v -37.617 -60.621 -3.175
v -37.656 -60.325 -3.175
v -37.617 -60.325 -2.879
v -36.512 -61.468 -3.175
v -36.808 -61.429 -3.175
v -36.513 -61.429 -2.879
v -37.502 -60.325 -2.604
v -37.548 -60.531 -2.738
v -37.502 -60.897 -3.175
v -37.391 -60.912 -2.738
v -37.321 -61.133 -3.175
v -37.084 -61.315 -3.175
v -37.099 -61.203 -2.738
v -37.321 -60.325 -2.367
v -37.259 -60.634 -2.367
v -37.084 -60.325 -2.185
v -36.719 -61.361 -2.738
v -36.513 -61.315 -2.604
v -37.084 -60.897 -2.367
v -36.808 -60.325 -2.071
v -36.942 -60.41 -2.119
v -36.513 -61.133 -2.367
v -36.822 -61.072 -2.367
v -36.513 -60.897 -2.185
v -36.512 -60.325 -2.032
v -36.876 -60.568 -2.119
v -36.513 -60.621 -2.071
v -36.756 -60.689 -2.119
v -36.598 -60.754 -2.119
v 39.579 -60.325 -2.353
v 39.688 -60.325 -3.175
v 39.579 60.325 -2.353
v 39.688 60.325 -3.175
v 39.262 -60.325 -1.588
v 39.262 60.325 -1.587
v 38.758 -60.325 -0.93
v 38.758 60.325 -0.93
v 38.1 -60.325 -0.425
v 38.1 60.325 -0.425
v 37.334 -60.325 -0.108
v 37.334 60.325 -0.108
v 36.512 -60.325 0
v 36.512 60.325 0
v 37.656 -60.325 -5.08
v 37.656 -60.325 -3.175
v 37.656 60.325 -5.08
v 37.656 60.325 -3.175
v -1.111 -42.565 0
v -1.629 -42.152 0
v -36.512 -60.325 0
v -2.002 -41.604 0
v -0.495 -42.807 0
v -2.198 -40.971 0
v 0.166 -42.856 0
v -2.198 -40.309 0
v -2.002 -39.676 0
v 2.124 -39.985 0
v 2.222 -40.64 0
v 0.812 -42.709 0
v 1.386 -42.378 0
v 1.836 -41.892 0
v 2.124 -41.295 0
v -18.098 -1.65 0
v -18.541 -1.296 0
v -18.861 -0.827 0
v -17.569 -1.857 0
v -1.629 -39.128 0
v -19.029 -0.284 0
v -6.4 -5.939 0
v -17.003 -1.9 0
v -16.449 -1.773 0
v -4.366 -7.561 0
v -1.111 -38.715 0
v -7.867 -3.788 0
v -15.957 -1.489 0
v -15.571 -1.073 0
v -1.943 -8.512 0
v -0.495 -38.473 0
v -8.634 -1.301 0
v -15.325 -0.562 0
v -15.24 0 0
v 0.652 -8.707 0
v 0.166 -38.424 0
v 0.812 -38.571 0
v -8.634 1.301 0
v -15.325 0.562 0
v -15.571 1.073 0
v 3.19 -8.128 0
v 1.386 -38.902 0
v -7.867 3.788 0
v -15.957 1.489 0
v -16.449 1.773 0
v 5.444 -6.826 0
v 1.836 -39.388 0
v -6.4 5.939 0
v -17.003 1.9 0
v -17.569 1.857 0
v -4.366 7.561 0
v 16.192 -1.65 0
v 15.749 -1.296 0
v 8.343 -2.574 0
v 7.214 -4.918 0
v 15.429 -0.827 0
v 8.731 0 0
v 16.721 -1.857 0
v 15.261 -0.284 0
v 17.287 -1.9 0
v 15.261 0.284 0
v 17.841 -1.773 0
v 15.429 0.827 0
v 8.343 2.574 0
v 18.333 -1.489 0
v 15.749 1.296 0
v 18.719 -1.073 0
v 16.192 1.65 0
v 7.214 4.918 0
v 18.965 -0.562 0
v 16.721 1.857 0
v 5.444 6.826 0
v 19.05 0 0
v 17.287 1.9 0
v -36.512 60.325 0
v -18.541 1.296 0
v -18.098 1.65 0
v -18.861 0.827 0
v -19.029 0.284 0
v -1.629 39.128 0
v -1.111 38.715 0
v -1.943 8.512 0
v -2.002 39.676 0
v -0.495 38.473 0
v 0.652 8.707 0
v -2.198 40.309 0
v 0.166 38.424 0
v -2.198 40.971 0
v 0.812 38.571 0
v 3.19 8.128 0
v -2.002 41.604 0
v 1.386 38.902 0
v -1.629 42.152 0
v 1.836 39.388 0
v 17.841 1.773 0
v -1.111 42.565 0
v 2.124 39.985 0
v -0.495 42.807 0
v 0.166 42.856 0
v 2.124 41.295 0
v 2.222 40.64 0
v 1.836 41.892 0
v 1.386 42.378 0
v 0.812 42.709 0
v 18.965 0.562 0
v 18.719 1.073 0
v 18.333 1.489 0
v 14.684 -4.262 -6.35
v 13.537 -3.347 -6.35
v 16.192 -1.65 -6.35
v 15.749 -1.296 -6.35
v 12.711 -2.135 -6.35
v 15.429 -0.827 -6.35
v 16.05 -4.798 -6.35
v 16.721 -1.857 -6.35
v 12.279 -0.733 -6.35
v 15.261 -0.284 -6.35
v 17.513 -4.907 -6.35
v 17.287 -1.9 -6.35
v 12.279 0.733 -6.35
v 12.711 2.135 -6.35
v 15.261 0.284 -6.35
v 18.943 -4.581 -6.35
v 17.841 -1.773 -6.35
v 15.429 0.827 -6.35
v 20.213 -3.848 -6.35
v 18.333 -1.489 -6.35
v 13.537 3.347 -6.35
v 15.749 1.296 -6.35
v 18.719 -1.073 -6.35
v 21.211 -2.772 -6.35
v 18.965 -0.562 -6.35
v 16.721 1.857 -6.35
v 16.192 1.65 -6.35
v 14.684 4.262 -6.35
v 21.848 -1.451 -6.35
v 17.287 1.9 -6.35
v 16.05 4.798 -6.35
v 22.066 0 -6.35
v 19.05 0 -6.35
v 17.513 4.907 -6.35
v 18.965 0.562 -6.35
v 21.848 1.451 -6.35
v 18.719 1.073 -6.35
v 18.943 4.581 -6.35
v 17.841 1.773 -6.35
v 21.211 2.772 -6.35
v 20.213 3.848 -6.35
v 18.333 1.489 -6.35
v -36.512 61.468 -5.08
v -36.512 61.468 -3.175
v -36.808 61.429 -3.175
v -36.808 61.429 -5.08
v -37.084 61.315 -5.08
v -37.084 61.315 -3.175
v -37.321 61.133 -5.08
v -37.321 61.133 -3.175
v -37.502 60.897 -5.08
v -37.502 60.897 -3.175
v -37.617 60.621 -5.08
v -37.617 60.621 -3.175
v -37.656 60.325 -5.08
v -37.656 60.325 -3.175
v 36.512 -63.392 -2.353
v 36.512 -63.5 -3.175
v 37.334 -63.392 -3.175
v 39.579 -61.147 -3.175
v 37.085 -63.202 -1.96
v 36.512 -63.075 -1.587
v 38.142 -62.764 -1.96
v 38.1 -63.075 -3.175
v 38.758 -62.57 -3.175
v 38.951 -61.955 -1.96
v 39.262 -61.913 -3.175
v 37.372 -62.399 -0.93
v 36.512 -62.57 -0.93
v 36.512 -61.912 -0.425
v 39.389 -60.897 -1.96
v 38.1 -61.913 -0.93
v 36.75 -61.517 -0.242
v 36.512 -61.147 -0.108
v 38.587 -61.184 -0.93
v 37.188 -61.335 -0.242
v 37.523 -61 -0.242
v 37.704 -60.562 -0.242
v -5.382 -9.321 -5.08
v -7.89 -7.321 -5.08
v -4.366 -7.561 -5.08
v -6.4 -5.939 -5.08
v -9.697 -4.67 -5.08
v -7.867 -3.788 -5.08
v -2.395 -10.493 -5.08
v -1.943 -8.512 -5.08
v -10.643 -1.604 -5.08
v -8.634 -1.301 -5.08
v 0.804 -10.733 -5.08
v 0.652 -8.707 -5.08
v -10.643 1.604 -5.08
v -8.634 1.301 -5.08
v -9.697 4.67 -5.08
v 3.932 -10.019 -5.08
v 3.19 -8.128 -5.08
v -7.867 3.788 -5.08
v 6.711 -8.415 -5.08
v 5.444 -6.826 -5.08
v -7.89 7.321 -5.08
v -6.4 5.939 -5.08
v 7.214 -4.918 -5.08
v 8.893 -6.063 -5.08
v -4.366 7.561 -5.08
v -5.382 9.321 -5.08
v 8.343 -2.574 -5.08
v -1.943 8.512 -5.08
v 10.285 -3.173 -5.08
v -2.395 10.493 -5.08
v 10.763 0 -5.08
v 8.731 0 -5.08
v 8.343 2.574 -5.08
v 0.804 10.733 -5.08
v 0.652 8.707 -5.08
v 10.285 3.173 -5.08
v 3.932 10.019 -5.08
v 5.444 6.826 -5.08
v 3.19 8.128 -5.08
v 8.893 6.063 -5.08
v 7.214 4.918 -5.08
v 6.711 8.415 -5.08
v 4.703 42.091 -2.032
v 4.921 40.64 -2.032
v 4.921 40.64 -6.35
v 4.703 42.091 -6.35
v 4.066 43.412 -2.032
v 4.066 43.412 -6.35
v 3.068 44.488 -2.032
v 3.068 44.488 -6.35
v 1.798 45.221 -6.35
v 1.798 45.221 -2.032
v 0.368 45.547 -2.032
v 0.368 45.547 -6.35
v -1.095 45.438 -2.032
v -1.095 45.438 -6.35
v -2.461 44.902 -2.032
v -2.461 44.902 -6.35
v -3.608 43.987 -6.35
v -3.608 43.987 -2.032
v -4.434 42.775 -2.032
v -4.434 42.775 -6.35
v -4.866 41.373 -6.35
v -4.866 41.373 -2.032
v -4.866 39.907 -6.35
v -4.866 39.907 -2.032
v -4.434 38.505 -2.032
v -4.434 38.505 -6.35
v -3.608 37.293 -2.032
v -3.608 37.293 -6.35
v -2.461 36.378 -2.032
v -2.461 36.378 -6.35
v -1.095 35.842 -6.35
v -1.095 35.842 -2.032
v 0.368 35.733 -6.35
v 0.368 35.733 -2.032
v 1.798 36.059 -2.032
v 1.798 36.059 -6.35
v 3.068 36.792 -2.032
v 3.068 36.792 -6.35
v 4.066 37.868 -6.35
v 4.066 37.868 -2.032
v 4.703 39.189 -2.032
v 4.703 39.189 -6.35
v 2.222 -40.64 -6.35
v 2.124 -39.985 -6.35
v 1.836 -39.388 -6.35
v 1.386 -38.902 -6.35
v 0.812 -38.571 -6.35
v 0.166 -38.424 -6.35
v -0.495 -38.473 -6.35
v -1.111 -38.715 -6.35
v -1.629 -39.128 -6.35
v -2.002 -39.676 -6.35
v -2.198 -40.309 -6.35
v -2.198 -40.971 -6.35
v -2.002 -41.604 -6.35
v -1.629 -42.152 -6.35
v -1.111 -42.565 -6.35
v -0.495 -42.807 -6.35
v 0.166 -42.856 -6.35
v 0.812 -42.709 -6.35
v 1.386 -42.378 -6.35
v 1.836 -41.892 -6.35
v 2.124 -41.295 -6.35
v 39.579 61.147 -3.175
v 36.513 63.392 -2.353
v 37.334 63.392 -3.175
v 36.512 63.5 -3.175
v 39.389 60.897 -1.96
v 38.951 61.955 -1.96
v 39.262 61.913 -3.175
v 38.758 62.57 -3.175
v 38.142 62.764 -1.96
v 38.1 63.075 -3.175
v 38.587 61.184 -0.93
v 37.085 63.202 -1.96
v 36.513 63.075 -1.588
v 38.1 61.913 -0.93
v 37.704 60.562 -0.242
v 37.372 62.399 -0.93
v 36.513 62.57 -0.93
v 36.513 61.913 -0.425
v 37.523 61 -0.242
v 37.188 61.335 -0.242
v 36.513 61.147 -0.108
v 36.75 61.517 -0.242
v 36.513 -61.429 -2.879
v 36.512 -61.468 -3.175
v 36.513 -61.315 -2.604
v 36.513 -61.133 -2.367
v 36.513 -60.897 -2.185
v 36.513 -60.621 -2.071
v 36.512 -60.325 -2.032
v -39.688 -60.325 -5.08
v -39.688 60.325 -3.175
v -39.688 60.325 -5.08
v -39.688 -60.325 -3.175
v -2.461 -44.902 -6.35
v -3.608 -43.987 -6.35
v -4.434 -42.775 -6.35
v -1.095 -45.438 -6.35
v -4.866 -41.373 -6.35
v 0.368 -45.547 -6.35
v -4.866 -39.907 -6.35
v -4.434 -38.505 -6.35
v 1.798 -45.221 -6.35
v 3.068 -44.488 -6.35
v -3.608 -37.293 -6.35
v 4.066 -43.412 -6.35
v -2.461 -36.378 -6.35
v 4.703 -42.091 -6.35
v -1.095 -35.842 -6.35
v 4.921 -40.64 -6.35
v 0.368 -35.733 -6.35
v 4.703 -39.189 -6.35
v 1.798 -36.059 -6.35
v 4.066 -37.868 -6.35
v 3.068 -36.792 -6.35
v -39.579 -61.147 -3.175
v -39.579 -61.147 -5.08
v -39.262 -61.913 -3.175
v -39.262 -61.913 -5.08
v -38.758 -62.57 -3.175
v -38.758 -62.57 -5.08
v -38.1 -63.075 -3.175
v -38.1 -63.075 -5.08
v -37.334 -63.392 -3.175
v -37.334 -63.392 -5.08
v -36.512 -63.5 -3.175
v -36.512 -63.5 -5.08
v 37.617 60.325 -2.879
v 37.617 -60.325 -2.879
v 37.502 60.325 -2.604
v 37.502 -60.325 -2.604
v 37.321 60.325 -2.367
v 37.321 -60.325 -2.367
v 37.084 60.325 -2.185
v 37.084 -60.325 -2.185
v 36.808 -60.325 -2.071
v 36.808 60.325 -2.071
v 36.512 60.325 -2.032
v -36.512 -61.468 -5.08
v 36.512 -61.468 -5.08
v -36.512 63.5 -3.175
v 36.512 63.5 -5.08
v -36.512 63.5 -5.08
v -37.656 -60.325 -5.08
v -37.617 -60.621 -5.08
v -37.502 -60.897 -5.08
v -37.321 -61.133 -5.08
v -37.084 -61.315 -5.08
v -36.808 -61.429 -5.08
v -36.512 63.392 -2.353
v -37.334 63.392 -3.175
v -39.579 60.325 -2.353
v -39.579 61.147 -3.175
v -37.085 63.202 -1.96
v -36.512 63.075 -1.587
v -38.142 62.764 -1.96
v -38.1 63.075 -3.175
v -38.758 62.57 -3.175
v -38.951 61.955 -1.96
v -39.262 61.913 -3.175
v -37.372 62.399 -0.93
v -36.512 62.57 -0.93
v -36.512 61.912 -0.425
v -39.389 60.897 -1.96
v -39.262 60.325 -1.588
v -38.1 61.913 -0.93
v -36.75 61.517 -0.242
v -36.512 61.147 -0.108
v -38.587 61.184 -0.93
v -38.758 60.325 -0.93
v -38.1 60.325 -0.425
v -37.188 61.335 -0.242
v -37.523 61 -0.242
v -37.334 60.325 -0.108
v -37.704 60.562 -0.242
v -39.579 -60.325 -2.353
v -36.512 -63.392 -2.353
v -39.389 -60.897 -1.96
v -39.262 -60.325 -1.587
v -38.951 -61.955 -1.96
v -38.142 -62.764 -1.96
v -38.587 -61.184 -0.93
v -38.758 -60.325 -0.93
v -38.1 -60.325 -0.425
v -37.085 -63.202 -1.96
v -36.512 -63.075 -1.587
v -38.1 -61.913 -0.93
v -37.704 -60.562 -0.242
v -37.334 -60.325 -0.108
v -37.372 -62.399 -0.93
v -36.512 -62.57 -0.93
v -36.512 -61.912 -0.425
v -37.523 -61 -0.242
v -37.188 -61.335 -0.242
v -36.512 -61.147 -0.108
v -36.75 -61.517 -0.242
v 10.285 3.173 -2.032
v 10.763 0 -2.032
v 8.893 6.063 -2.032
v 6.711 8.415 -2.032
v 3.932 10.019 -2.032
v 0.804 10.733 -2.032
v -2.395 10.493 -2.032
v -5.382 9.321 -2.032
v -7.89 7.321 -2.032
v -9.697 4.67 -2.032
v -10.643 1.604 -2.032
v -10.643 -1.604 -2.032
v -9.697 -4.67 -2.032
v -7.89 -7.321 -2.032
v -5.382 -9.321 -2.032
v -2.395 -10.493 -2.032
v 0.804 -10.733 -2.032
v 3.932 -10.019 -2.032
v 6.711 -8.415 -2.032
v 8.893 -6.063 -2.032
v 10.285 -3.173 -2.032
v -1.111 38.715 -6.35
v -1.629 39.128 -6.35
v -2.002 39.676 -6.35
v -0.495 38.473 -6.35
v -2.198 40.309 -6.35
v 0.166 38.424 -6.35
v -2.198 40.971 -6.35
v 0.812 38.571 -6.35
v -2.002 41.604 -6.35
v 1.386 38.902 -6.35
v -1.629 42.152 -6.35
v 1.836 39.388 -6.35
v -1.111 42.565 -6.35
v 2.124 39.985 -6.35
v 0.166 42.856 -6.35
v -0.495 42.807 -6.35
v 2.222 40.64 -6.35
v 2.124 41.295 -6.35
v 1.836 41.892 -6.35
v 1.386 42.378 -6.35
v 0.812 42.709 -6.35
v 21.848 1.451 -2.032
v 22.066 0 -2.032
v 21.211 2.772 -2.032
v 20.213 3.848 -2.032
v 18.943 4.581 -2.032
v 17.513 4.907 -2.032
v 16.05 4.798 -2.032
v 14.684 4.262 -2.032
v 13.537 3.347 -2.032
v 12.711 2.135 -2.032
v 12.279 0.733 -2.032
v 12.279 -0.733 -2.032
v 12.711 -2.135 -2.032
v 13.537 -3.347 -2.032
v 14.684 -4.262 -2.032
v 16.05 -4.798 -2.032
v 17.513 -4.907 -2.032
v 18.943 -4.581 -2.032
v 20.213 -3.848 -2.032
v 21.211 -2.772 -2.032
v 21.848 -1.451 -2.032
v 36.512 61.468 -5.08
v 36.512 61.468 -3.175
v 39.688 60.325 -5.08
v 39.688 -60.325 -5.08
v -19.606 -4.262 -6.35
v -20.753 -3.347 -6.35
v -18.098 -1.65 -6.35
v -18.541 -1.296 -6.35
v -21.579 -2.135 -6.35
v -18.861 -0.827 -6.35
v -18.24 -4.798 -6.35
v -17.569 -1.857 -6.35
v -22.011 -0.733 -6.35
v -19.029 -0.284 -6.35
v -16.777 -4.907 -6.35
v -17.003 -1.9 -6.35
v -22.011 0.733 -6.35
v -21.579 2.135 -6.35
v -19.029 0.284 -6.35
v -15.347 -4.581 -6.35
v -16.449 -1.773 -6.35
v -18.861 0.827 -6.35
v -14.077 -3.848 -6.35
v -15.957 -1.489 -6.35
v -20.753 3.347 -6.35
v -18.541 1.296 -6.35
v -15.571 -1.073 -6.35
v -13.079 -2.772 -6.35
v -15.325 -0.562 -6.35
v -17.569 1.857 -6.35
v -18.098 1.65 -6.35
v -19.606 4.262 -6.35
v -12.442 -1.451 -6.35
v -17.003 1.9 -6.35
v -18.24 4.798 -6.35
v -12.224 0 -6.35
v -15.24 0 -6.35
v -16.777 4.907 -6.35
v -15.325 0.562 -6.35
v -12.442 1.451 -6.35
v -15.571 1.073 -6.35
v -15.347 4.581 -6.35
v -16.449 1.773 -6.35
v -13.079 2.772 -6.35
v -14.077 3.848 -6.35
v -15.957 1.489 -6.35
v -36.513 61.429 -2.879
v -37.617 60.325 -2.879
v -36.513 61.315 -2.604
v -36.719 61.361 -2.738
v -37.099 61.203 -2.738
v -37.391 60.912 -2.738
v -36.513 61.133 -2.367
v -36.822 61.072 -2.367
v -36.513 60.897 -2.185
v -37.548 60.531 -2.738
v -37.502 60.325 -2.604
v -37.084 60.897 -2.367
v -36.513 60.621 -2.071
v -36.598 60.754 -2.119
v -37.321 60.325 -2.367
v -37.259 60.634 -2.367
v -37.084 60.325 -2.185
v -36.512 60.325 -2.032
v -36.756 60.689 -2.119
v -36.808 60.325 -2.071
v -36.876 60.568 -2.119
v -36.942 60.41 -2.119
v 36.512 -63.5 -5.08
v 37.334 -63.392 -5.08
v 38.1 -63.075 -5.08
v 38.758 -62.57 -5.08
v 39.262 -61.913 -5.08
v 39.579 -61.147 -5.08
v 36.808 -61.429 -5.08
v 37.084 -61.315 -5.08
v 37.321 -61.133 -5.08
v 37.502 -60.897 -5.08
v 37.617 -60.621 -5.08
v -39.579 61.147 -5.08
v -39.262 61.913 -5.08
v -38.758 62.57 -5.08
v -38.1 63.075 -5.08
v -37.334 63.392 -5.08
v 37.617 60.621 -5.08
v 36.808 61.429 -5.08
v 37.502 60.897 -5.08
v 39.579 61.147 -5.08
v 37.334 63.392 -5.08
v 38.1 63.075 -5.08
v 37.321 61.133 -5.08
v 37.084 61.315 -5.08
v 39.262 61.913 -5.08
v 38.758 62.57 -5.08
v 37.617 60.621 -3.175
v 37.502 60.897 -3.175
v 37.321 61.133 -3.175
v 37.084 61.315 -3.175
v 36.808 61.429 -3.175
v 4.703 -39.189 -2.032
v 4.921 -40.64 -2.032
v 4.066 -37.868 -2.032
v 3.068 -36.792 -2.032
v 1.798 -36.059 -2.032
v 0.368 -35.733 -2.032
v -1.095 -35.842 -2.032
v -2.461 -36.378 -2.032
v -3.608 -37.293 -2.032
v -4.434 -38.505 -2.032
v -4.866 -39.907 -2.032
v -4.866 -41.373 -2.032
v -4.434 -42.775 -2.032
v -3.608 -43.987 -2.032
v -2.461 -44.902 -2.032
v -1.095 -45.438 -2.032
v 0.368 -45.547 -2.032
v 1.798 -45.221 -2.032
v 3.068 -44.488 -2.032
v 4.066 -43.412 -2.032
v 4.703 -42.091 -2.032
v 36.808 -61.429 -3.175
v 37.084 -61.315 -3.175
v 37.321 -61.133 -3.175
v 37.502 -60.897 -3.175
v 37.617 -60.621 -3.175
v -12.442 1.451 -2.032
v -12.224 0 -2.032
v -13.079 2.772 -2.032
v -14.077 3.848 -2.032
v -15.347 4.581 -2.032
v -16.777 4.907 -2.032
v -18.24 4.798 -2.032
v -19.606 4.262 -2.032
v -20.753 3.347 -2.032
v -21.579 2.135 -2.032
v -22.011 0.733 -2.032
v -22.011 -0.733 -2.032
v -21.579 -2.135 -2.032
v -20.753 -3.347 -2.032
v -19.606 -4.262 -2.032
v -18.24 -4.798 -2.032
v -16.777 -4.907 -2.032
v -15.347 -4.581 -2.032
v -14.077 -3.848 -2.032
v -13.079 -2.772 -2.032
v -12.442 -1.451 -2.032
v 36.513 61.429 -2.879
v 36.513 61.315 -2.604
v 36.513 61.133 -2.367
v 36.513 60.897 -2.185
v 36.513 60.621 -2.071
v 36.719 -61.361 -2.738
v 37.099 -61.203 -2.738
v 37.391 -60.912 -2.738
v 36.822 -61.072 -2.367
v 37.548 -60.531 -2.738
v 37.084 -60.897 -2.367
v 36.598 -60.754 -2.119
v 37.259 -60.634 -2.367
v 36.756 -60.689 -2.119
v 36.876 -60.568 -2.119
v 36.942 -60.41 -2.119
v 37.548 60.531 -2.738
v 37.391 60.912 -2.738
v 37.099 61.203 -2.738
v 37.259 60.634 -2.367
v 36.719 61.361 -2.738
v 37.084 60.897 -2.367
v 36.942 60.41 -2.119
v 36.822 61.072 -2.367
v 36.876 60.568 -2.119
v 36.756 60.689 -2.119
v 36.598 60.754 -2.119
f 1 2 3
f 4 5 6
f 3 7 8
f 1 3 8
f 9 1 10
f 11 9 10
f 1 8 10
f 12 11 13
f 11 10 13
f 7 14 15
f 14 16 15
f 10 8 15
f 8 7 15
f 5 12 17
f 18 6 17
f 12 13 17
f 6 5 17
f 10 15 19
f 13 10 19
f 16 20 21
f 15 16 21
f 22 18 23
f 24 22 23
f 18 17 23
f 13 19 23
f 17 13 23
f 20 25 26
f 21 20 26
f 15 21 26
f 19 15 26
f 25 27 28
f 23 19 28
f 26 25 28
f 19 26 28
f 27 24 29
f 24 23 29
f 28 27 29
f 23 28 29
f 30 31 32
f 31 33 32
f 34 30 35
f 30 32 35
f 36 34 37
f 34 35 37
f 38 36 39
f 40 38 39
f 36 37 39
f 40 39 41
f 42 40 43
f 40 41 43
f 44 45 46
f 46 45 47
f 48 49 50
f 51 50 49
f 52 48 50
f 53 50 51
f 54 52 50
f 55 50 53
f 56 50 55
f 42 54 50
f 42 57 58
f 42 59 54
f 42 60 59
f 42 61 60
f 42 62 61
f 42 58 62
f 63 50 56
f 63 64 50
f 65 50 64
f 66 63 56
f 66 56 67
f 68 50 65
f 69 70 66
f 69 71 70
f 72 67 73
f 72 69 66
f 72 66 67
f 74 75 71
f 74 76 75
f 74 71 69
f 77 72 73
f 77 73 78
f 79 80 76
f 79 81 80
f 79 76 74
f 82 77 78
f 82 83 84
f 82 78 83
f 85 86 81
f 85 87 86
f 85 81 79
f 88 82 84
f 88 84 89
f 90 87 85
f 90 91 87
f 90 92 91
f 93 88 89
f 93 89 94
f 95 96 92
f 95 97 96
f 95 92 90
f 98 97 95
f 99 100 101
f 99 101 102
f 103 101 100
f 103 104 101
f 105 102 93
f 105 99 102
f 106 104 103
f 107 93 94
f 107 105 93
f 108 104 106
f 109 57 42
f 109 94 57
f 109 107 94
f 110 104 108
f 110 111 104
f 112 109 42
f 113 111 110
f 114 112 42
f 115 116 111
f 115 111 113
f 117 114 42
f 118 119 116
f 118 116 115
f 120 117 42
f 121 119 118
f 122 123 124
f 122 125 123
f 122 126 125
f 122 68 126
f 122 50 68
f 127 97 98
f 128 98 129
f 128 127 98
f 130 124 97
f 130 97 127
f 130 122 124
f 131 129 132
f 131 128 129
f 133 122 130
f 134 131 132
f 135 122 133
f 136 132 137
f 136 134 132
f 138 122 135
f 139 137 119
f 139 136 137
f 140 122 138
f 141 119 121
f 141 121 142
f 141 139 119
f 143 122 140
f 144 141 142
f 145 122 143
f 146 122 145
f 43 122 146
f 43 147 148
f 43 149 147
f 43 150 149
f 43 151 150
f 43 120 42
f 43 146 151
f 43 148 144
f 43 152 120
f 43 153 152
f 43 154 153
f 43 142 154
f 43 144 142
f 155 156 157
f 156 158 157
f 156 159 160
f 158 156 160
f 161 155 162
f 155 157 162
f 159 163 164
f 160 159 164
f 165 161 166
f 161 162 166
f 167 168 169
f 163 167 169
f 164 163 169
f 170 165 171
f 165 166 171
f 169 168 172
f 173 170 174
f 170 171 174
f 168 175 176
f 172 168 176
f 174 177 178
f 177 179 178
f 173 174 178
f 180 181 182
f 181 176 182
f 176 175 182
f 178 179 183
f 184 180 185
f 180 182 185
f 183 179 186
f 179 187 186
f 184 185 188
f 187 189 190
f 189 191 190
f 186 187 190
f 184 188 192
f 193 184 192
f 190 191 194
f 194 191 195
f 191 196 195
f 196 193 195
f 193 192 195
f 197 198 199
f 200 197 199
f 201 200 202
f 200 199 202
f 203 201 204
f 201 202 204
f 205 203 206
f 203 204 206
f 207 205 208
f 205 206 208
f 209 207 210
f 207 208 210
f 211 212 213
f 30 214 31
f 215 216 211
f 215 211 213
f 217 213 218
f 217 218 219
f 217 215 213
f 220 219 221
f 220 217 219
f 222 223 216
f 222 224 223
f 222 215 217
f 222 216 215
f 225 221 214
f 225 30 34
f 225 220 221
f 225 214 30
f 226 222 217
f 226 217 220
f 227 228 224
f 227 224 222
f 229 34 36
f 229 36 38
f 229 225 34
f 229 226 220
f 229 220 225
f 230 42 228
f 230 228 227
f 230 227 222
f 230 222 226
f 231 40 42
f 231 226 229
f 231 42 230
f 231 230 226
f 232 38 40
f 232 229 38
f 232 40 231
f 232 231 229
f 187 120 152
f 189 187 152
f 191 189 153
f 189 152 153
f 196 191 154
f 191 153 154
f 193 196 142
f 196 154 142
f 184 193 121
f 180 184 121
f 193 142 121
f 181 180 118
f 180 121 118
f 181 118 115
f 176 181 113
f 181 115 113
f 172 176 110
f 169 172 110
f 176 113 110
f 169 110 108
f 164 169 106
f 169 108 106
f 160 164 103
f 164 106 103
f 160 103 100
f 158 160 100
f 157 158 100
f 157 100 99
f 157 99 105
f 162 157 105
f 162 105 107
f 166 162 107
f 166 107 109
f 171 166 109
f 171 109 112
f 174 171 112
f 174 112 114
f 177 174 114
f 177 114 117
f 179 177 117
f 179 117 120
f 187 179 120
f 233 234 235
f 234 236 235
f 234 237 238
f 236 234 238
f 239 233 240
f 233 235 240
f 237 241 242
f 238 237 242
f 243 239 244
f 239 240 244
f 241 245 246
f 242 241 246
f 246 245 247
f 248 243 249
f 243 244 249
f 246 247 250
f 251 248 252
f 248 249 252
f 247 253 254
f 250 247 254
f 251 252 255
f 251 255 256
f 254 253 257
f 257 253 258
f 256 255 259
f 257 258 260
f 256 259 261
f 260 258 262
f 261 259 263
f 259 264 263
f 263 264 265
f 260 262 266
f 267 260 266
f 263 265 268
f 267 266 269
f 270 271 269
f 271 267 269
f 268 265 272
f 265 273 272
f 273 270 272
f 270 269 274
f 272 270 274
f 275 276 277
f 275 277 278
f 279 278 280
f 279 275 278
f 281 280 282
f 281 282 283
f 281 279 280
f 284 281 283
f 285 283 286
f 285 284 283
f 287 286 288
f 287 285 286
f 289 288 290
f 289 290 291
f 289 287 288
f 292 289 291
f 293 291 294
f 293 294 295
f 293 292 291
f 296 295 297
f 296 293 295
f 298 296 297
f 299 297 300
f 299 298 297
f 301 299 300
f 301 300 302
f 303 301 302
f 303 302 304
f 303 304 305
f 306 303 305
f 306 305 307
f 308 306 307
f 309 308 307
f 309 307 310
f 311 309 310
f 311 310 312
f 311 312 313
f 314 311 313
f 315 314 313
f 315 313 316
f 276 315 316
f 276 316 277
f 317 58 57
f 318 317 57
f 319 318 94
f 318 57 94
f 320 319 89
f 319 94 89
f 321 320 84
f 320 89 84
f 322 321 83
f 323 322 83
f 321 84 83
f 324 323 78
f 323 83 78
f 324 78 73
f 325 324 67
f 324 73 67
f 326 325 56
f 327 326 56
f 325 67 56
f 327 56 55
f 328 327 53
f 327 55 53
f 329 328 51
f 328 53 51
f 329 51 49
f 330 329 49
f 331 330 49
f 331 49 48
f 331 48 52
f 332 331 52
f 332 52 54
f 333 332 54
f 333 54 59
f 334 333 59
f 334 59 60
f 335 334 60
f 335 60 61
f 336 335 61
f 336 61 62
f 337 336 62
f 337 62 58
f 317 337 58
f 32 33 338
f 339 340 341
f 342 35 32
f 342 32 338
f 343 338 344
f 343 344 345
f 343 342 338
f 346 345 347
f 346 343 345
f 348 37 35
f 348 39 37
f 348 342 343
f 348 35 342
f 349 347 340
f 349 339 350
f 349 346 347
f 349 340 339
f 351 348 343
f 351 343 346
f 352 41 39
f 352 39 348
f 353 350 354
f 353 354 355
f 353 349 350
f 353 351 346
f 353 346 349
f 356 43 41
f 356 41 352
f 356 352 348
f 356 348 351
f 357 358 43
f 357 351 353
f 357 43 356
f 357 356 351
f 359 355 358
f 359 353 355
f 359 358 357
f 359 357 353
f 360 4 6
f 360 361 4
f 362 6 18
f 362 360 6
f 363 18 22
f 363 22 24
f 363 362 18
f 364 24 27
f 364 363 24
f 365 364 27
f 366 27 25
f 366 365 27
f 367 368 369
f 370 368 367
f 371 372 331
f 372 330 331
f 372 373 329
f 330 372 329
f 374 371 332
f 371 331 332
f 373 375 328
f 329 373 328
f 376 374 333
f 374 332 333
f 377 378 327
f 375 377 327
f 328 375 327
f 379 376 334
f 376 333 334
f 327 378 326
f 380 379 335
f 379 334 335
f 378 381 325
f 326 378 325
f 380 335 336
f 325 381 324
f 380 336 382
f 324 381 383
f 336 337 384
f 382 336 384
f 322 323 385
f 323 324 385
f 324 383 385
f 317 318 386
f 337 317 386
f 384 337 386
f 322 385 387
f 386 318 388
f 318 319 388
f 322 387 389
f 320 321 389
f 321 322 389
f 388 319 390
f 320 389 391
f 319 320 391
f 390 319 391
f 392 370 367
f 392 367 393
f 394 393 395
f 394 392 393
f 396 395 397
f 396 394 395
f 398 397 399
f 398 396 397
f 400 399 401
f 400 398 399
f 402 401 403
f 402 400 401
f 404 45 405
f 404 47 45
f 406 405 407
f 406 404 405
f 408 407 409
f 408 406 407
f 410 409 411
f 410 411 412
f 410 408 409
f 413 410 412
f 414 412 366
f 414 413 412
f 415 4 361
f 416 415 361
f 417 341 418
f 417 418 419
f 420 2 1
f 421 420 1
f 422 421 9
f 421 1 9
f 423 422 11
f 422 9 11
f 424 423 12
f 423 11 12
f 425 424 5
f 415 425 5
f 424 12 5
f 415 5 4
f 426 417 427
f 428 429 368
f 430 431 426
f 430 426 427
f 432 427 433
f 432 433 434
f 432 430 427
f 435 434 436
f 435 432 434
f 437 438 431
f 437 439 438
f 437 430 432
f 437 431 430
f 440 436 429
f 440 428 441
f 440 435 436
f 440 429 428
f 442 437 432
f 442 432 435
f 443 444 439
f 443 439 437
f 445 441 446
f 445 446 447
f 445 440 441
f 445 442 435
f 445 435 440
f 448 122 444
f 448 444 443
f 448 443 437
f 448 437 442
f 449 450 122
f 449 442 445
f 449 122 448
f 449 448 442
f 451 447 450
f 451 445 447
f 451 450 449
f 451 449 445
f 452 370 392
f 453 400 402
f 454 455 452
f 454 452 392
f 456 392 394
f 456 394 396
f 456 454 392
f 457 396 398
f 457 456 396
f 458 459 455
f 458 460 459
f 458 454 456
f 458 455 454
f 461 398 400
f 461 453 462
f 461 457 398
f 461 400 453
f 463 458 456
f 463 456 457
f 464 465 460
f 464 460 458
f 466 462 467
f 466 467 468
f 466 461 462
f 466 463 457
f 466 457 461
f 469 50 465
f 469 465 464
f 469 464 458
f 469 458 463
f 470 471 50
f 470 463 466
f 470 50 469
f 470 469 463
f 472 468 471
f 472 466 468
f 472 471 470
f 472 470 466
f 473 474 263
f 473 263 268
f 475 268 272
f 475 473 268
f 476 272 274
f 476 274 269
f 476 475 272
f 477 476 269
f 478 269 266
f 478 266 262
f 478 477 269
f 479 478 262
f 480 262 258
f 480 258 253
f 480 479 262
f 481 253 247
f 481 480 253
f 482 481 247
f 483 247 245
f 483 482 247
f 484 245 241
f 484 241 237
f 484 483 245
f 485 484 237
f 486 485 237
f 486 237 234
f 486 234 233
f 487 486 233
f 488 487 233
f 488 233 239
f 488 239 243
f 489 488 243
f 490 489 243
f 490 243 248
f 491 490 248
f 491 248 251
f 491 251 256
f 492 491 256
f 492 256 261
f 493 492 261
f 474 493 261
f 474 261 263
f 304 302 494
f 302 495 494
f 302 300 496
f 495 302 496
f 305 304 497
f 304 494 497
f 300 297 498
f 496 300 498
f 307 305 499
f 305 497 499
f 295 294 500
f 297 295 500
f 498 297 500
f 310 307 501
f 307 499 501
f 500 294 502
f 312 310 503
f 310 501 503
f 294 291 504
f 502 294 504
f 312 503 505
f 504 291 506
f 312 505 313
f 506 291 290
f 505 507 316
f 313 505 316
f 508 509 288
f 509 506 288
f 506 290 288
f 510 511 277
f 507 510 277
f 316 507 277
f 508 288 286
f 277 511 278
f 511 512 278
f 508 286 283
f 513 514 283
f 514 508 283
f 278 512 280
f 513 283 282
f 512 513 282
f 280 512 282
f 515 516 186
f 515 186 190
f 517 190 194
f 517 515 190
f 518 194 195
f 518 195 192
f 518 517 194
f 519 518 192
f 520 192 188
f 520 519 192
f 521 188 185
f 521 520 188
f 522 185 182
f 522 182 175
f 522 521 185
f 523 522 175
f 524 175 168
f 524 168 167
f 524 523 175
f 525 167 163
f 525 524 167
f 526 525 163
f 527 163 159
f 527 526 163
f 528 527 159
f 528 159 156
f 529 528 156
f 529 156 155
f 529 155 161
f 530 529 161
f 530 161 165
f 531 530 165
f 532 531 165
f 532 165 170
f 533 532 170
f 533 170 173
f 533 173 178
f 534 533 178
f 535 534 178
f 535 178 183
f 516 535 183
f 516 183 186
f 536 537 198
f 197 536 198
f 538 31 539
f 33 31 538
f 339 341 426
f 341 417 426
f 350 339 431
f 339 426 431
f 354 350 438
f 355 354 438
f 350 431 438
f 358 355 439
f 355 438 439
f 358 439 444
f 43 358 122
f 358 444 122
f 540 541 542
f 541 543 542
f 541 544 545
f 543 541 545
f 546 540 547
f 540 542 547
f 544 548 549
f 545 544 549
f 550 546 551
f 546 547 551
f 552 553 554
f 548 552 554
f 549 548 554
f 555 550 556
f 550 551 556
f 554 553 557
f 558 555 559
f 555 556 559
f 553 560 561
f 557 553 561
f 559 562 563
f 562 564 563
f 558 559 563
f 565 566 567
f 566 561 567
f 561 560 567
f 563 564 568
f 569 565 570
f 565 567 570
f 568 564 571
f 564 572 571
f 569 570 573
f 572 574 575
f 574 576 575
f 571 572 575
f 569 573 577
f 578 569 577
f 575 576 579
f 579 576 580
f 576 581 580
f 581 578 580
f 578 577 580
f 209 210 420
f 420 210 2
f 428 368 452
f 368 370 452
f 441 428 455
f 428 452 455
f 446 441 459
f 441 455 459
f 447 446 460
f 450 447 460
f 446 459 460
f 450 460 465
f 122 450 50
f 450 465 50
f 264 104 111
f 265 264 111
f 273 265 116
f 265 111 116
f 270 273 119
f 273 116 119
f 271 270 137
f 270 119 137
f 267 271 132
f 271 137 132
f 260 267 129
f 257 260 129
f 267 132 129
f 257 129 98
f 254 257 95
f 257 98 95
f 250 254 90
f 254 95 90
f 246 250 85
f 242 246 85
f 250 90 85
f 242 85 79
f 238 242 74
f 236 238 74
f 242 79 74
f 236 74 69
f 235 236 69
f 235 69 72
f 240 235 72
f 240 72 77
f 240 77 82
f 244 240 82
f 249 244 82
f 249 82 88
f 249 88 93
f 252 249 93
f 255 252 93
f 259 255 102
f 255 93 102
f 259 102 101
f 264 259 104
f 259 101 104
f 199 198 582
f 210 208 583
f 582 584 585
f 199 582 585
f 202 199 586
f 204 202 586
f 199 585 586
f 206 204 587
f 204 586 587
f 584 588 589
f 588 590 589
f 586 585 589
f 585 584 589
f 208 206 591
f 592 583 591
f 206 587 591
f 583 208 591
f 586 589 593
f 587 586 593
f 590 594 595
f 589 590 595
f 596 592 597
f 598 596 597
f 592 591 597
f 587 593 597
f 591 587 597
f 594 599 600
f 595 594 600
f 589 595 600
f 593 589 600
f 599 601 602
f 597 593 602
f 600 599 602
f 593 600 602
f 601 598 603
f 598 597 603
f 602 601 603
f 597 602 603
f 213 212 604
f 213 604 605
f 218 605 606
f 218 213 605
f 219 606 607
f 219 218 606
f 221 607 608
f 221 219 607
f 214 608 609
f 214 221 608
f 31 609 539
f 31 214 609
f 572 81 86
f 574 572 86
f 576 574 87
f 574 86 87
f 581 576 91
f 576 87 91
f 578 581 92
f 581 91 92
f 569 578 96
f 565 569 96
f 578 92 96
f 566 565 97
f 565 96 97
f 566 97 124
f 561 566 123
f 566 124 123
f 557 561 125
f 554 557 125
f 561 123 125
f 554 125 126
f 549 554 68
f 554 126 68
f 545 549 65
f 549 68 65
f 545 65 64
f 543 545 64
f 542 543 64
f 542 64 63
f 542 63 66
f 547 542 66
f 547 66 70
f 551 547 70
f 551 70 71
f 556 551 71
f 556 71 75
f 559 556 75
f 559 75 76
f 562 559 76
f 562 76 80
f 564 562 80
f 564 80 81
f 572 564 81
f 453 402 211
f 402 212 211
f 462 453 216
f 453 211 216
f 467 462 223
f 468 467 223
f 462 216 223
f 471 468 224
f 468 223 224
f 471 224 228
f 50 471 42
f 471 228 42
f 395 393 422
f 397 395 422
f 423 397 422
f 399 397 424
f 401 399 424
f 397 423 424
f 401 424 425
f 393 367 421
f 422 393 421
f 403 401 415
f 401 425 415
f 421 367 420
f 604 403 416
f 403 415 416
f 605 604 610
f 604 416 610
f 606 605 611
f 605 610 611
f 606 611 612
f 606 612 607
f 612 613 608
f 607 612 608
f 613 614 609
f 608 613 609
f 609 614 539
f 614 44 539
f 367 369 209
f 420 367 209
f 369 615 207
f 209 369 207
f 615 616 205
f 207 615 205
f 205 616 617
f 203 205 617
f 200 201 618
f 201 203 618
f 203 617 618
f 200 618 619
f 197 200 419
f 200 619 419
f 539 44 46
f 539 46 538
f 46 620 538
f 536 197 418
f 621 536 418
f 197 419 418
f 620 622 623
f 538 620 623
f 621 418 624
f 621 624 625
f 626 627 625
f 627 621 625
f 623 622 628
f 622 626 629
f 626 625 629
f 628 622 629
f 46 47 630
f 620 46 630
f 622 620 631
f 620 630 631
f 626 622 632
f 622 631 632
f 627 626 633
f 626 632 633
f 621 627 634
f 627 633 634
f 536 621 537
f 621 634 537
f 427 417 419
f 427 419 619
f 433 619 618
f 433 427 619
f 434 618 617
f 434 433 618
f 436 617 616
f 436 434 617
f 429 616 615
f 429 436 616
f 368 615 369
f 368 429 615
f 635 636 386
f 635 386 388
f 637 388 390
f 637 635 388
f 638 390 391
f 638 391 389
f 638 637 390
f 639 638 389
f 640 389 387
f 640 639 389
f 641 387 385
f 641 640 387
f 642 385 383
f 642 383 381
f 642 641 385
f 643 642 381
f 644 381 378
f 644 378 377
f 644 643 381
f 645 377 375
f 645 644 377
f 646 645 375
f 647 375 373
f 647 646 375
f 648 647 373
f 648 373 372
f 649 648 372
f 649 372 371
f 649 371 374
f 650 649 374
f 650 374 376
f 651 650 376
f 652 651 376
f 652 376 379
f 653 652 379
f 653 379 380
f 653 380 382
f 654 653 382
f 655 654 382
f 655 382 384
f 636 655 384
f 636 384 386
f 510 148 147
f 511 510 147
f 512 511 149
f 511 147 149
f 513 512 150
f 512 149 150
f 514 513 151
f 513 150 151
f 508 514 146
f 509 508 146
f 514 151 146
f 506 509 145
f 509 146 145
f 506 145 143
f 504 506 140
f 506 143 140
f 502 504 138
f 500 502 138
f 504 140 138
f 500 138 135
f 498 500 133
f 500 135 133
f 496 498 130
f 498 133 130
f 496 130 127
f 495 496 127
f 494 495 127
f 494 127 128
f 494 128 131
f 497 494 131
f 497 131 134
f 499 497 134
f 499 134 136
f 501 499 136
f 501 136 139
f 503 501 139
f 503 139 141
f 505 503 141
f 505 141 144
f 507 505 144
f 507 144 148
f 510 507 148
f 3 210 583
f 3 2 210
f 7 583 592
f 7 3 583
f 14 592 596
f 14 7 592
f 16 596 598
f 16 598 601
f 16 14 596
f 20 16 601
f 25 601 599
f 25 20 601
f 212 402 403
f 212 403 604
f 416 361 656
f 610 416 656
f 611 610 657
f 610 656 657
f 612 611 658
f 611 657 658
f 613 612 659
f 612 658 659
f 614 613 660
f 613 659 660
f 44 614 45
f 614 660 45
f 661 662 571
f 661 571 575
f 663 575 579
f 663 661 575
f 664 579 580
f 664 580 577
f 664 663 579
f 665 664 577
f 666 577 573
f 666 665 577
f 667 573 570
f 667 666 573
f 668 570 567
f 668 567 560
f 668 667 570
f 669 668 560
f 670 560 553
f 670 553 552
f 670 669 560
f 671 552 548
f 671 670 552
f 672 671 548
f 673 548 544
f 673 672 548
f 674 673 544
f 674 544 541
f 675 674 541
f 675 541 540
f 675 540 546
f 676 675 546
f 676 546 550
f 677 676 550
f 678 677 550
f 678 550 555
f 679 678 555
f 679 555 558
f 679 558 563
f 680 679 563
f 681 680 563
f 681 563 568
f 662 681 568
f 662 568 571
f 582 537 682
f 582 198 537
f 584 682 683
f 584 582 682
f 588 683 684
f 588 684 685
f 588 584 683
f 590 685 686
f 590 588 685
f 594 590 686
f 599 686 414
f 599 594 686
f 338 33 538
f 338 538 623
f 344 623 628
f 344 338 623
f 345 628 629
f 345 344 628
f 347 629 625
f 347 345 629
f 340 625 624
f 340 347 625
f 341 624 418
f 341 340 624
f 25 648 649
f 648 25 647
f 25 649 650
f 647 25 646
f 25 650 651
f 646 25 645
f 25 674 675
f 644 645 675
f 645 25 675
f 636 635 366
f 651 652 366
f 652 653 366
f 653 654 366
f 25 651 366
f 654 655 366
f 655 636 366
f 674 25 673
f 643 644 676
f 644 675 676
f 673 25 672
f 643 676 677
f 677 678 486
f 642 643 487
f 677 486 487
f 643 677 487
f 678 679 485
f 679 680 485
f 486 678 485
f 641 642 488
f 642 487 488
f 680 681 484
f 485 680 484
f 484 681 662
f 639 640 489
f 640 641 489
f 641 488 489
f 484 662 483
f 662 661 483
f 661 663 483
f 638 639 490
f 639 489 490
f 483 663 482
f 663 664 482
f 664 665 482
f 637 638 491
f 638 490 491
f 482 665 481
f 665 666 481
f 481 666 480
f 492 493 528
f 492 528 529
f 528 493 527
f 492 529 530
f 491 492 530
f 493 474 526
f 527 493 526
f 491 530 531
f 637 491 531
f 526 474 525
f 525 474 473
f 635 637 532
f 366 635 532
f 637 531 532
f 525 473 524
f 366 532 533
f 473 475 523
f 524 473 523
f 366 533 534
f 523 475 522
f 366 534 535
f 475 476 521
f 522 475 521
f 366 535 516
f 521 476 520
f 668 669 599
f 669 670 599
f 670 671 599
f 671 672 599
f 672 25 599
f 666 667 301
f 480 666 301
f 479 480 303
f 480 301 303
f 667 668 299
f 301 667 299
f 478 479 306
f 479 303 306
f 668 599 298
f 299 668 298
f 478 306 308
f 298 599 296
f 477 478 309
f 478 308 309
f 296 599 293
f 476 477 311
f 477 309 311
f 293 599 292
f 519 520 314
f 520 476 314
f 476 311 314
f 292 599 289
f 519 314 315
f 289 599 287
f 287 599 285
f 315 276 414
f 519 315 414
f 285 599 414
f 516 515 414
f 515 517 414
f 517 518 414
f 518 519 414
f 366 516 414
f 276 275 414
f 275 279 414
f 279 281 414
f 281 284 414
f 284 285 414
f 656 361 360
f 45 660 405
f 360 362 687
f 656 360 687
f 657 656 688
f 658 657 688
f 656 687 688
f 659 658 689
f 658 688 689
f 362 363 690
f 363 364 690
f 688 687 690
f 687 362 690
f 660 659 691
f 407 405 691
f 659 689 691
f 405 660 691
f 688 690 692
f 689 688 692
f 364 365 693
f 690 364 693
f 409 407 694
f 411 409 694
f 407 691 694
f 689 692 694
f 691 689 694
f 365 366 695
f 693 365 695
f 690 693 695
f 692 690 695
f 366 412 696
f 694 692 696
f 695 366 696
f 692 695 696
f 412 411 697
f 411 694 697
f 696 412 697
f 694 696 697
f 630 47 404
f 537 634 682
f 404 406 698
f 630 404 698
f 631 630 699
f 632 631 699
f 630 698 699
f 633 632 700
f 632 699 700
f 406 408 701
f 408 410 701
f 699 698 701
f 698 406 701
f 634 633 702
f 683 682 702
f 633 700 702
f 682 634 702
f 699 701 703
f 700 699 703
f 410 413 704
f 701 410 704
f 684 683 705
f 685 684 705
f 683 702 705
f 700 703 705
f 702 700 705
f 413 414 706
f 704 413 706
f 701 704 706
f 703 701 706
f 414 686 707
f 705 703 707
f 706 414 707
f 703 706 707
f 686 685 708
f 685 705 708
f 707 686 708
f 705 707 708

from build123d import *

# Parameters (mm, degrees)
F0_R     = 2.2225
F0_R_2   = 1.905
F0_R_3   = 8.73125
F1_DEPTH = 5.08
F2_R     = 3.175
F3_T     = -2.032
F4_R     = 4.92125
F4_R_2   = 1.905
F4_R_3   = 2.2225
F5_DEPTH = 6.35


with BuildPart() as f1:
    # F0 (on Top) → F1 (new body)
    with BuildSketch(Plane.XY):
        with BuildLine():
            ThreePointArc((39.6875, 60.325), (38.7575640303, 62.5700640303), (36.5125, 63.5))
            Line((36.5125, 63.5), (-36.5125, 63.5))
            ThreePointArc((-36.5125, 63.5), (-38.7575640303, 62.5700640303), (-39.6875, 60.325))
            Line((-39.6875, 60.325), (-39.6875, -60.325))
            ThreePointArc((-39.6875, -60.325), (-38.7575640303, -62.5700640303), (-36.5125, -63.5))
            Line((-36.5125, -63.5), (36.5125, -63.5))
            ThreePointArc((36.5125, -63.5), (38.7575640303, -62.5700640303), (39.6875, -60.325))
            Line((39.6875, -60.325), (39.6875, 60.325))
        make_face()
        with Locations((0, -40.64)):
            Circle(F0_R, mode=Mode.SUBTRACT)
        with Locations((-17.145, 0)):
            Circle(F0_R_2, mode=Mode.SUBTRACT)
        Circle(F0_R_3, mode=Mode.SUBTRACT)
        with Locations((17.145, 0)):
            Circle(F0_R_2, mode=Mode.SUBTRACT)
        with Locations((0, 40.64)):
            Circle(F0_R, mode=Mode.SUBTRACT)
    extrude(amount=-F1_DEPTH)

    # F2
    f2_edges = [f1.edges().sort_by_distance(p)[0] for p in [
        (0, -63.5, 0),
    ]]
    fillet(f2_edges, radius=F2_R)

    # F3
    f3_openings = [f1.faces().sort_by_distance(p)[0] for p in [
        (38.189855, 0, -5.08),
    ]]
    offset(amount=F3_T, openings=f3_openings)

    # F4 (on face) → F5 (join)
    with BuildSketch(Plane.XY):
        with Locations((-17.145, 0)):
            Circle(F4_R)
        with Locations((-17.145, 0)):
            Circle(F4_R_2, mode=Mode.SUBTRACT)
        with Locations((17.145, 0)):
            Circle(F4_R)
        with Locations((17.145, 0)):
            Circle(F4_R_2, mode=Mode.SUBTRACT)
        with Locations((0, 40.64)):
            Circle(F4_R)
        with Locations((0, 40.64)):
            Circle(F4_R_3, mode=Mode.SUBTRACT)
        with Locations((0, -40.64)):
            Circle(F4_R)
        with Locations((0, -40.64)):
            Circle(F4_R_3, mode=Mode.SUBTRACT)
    extrude(amount=-F5_DEPTH)


solid = f1.part
